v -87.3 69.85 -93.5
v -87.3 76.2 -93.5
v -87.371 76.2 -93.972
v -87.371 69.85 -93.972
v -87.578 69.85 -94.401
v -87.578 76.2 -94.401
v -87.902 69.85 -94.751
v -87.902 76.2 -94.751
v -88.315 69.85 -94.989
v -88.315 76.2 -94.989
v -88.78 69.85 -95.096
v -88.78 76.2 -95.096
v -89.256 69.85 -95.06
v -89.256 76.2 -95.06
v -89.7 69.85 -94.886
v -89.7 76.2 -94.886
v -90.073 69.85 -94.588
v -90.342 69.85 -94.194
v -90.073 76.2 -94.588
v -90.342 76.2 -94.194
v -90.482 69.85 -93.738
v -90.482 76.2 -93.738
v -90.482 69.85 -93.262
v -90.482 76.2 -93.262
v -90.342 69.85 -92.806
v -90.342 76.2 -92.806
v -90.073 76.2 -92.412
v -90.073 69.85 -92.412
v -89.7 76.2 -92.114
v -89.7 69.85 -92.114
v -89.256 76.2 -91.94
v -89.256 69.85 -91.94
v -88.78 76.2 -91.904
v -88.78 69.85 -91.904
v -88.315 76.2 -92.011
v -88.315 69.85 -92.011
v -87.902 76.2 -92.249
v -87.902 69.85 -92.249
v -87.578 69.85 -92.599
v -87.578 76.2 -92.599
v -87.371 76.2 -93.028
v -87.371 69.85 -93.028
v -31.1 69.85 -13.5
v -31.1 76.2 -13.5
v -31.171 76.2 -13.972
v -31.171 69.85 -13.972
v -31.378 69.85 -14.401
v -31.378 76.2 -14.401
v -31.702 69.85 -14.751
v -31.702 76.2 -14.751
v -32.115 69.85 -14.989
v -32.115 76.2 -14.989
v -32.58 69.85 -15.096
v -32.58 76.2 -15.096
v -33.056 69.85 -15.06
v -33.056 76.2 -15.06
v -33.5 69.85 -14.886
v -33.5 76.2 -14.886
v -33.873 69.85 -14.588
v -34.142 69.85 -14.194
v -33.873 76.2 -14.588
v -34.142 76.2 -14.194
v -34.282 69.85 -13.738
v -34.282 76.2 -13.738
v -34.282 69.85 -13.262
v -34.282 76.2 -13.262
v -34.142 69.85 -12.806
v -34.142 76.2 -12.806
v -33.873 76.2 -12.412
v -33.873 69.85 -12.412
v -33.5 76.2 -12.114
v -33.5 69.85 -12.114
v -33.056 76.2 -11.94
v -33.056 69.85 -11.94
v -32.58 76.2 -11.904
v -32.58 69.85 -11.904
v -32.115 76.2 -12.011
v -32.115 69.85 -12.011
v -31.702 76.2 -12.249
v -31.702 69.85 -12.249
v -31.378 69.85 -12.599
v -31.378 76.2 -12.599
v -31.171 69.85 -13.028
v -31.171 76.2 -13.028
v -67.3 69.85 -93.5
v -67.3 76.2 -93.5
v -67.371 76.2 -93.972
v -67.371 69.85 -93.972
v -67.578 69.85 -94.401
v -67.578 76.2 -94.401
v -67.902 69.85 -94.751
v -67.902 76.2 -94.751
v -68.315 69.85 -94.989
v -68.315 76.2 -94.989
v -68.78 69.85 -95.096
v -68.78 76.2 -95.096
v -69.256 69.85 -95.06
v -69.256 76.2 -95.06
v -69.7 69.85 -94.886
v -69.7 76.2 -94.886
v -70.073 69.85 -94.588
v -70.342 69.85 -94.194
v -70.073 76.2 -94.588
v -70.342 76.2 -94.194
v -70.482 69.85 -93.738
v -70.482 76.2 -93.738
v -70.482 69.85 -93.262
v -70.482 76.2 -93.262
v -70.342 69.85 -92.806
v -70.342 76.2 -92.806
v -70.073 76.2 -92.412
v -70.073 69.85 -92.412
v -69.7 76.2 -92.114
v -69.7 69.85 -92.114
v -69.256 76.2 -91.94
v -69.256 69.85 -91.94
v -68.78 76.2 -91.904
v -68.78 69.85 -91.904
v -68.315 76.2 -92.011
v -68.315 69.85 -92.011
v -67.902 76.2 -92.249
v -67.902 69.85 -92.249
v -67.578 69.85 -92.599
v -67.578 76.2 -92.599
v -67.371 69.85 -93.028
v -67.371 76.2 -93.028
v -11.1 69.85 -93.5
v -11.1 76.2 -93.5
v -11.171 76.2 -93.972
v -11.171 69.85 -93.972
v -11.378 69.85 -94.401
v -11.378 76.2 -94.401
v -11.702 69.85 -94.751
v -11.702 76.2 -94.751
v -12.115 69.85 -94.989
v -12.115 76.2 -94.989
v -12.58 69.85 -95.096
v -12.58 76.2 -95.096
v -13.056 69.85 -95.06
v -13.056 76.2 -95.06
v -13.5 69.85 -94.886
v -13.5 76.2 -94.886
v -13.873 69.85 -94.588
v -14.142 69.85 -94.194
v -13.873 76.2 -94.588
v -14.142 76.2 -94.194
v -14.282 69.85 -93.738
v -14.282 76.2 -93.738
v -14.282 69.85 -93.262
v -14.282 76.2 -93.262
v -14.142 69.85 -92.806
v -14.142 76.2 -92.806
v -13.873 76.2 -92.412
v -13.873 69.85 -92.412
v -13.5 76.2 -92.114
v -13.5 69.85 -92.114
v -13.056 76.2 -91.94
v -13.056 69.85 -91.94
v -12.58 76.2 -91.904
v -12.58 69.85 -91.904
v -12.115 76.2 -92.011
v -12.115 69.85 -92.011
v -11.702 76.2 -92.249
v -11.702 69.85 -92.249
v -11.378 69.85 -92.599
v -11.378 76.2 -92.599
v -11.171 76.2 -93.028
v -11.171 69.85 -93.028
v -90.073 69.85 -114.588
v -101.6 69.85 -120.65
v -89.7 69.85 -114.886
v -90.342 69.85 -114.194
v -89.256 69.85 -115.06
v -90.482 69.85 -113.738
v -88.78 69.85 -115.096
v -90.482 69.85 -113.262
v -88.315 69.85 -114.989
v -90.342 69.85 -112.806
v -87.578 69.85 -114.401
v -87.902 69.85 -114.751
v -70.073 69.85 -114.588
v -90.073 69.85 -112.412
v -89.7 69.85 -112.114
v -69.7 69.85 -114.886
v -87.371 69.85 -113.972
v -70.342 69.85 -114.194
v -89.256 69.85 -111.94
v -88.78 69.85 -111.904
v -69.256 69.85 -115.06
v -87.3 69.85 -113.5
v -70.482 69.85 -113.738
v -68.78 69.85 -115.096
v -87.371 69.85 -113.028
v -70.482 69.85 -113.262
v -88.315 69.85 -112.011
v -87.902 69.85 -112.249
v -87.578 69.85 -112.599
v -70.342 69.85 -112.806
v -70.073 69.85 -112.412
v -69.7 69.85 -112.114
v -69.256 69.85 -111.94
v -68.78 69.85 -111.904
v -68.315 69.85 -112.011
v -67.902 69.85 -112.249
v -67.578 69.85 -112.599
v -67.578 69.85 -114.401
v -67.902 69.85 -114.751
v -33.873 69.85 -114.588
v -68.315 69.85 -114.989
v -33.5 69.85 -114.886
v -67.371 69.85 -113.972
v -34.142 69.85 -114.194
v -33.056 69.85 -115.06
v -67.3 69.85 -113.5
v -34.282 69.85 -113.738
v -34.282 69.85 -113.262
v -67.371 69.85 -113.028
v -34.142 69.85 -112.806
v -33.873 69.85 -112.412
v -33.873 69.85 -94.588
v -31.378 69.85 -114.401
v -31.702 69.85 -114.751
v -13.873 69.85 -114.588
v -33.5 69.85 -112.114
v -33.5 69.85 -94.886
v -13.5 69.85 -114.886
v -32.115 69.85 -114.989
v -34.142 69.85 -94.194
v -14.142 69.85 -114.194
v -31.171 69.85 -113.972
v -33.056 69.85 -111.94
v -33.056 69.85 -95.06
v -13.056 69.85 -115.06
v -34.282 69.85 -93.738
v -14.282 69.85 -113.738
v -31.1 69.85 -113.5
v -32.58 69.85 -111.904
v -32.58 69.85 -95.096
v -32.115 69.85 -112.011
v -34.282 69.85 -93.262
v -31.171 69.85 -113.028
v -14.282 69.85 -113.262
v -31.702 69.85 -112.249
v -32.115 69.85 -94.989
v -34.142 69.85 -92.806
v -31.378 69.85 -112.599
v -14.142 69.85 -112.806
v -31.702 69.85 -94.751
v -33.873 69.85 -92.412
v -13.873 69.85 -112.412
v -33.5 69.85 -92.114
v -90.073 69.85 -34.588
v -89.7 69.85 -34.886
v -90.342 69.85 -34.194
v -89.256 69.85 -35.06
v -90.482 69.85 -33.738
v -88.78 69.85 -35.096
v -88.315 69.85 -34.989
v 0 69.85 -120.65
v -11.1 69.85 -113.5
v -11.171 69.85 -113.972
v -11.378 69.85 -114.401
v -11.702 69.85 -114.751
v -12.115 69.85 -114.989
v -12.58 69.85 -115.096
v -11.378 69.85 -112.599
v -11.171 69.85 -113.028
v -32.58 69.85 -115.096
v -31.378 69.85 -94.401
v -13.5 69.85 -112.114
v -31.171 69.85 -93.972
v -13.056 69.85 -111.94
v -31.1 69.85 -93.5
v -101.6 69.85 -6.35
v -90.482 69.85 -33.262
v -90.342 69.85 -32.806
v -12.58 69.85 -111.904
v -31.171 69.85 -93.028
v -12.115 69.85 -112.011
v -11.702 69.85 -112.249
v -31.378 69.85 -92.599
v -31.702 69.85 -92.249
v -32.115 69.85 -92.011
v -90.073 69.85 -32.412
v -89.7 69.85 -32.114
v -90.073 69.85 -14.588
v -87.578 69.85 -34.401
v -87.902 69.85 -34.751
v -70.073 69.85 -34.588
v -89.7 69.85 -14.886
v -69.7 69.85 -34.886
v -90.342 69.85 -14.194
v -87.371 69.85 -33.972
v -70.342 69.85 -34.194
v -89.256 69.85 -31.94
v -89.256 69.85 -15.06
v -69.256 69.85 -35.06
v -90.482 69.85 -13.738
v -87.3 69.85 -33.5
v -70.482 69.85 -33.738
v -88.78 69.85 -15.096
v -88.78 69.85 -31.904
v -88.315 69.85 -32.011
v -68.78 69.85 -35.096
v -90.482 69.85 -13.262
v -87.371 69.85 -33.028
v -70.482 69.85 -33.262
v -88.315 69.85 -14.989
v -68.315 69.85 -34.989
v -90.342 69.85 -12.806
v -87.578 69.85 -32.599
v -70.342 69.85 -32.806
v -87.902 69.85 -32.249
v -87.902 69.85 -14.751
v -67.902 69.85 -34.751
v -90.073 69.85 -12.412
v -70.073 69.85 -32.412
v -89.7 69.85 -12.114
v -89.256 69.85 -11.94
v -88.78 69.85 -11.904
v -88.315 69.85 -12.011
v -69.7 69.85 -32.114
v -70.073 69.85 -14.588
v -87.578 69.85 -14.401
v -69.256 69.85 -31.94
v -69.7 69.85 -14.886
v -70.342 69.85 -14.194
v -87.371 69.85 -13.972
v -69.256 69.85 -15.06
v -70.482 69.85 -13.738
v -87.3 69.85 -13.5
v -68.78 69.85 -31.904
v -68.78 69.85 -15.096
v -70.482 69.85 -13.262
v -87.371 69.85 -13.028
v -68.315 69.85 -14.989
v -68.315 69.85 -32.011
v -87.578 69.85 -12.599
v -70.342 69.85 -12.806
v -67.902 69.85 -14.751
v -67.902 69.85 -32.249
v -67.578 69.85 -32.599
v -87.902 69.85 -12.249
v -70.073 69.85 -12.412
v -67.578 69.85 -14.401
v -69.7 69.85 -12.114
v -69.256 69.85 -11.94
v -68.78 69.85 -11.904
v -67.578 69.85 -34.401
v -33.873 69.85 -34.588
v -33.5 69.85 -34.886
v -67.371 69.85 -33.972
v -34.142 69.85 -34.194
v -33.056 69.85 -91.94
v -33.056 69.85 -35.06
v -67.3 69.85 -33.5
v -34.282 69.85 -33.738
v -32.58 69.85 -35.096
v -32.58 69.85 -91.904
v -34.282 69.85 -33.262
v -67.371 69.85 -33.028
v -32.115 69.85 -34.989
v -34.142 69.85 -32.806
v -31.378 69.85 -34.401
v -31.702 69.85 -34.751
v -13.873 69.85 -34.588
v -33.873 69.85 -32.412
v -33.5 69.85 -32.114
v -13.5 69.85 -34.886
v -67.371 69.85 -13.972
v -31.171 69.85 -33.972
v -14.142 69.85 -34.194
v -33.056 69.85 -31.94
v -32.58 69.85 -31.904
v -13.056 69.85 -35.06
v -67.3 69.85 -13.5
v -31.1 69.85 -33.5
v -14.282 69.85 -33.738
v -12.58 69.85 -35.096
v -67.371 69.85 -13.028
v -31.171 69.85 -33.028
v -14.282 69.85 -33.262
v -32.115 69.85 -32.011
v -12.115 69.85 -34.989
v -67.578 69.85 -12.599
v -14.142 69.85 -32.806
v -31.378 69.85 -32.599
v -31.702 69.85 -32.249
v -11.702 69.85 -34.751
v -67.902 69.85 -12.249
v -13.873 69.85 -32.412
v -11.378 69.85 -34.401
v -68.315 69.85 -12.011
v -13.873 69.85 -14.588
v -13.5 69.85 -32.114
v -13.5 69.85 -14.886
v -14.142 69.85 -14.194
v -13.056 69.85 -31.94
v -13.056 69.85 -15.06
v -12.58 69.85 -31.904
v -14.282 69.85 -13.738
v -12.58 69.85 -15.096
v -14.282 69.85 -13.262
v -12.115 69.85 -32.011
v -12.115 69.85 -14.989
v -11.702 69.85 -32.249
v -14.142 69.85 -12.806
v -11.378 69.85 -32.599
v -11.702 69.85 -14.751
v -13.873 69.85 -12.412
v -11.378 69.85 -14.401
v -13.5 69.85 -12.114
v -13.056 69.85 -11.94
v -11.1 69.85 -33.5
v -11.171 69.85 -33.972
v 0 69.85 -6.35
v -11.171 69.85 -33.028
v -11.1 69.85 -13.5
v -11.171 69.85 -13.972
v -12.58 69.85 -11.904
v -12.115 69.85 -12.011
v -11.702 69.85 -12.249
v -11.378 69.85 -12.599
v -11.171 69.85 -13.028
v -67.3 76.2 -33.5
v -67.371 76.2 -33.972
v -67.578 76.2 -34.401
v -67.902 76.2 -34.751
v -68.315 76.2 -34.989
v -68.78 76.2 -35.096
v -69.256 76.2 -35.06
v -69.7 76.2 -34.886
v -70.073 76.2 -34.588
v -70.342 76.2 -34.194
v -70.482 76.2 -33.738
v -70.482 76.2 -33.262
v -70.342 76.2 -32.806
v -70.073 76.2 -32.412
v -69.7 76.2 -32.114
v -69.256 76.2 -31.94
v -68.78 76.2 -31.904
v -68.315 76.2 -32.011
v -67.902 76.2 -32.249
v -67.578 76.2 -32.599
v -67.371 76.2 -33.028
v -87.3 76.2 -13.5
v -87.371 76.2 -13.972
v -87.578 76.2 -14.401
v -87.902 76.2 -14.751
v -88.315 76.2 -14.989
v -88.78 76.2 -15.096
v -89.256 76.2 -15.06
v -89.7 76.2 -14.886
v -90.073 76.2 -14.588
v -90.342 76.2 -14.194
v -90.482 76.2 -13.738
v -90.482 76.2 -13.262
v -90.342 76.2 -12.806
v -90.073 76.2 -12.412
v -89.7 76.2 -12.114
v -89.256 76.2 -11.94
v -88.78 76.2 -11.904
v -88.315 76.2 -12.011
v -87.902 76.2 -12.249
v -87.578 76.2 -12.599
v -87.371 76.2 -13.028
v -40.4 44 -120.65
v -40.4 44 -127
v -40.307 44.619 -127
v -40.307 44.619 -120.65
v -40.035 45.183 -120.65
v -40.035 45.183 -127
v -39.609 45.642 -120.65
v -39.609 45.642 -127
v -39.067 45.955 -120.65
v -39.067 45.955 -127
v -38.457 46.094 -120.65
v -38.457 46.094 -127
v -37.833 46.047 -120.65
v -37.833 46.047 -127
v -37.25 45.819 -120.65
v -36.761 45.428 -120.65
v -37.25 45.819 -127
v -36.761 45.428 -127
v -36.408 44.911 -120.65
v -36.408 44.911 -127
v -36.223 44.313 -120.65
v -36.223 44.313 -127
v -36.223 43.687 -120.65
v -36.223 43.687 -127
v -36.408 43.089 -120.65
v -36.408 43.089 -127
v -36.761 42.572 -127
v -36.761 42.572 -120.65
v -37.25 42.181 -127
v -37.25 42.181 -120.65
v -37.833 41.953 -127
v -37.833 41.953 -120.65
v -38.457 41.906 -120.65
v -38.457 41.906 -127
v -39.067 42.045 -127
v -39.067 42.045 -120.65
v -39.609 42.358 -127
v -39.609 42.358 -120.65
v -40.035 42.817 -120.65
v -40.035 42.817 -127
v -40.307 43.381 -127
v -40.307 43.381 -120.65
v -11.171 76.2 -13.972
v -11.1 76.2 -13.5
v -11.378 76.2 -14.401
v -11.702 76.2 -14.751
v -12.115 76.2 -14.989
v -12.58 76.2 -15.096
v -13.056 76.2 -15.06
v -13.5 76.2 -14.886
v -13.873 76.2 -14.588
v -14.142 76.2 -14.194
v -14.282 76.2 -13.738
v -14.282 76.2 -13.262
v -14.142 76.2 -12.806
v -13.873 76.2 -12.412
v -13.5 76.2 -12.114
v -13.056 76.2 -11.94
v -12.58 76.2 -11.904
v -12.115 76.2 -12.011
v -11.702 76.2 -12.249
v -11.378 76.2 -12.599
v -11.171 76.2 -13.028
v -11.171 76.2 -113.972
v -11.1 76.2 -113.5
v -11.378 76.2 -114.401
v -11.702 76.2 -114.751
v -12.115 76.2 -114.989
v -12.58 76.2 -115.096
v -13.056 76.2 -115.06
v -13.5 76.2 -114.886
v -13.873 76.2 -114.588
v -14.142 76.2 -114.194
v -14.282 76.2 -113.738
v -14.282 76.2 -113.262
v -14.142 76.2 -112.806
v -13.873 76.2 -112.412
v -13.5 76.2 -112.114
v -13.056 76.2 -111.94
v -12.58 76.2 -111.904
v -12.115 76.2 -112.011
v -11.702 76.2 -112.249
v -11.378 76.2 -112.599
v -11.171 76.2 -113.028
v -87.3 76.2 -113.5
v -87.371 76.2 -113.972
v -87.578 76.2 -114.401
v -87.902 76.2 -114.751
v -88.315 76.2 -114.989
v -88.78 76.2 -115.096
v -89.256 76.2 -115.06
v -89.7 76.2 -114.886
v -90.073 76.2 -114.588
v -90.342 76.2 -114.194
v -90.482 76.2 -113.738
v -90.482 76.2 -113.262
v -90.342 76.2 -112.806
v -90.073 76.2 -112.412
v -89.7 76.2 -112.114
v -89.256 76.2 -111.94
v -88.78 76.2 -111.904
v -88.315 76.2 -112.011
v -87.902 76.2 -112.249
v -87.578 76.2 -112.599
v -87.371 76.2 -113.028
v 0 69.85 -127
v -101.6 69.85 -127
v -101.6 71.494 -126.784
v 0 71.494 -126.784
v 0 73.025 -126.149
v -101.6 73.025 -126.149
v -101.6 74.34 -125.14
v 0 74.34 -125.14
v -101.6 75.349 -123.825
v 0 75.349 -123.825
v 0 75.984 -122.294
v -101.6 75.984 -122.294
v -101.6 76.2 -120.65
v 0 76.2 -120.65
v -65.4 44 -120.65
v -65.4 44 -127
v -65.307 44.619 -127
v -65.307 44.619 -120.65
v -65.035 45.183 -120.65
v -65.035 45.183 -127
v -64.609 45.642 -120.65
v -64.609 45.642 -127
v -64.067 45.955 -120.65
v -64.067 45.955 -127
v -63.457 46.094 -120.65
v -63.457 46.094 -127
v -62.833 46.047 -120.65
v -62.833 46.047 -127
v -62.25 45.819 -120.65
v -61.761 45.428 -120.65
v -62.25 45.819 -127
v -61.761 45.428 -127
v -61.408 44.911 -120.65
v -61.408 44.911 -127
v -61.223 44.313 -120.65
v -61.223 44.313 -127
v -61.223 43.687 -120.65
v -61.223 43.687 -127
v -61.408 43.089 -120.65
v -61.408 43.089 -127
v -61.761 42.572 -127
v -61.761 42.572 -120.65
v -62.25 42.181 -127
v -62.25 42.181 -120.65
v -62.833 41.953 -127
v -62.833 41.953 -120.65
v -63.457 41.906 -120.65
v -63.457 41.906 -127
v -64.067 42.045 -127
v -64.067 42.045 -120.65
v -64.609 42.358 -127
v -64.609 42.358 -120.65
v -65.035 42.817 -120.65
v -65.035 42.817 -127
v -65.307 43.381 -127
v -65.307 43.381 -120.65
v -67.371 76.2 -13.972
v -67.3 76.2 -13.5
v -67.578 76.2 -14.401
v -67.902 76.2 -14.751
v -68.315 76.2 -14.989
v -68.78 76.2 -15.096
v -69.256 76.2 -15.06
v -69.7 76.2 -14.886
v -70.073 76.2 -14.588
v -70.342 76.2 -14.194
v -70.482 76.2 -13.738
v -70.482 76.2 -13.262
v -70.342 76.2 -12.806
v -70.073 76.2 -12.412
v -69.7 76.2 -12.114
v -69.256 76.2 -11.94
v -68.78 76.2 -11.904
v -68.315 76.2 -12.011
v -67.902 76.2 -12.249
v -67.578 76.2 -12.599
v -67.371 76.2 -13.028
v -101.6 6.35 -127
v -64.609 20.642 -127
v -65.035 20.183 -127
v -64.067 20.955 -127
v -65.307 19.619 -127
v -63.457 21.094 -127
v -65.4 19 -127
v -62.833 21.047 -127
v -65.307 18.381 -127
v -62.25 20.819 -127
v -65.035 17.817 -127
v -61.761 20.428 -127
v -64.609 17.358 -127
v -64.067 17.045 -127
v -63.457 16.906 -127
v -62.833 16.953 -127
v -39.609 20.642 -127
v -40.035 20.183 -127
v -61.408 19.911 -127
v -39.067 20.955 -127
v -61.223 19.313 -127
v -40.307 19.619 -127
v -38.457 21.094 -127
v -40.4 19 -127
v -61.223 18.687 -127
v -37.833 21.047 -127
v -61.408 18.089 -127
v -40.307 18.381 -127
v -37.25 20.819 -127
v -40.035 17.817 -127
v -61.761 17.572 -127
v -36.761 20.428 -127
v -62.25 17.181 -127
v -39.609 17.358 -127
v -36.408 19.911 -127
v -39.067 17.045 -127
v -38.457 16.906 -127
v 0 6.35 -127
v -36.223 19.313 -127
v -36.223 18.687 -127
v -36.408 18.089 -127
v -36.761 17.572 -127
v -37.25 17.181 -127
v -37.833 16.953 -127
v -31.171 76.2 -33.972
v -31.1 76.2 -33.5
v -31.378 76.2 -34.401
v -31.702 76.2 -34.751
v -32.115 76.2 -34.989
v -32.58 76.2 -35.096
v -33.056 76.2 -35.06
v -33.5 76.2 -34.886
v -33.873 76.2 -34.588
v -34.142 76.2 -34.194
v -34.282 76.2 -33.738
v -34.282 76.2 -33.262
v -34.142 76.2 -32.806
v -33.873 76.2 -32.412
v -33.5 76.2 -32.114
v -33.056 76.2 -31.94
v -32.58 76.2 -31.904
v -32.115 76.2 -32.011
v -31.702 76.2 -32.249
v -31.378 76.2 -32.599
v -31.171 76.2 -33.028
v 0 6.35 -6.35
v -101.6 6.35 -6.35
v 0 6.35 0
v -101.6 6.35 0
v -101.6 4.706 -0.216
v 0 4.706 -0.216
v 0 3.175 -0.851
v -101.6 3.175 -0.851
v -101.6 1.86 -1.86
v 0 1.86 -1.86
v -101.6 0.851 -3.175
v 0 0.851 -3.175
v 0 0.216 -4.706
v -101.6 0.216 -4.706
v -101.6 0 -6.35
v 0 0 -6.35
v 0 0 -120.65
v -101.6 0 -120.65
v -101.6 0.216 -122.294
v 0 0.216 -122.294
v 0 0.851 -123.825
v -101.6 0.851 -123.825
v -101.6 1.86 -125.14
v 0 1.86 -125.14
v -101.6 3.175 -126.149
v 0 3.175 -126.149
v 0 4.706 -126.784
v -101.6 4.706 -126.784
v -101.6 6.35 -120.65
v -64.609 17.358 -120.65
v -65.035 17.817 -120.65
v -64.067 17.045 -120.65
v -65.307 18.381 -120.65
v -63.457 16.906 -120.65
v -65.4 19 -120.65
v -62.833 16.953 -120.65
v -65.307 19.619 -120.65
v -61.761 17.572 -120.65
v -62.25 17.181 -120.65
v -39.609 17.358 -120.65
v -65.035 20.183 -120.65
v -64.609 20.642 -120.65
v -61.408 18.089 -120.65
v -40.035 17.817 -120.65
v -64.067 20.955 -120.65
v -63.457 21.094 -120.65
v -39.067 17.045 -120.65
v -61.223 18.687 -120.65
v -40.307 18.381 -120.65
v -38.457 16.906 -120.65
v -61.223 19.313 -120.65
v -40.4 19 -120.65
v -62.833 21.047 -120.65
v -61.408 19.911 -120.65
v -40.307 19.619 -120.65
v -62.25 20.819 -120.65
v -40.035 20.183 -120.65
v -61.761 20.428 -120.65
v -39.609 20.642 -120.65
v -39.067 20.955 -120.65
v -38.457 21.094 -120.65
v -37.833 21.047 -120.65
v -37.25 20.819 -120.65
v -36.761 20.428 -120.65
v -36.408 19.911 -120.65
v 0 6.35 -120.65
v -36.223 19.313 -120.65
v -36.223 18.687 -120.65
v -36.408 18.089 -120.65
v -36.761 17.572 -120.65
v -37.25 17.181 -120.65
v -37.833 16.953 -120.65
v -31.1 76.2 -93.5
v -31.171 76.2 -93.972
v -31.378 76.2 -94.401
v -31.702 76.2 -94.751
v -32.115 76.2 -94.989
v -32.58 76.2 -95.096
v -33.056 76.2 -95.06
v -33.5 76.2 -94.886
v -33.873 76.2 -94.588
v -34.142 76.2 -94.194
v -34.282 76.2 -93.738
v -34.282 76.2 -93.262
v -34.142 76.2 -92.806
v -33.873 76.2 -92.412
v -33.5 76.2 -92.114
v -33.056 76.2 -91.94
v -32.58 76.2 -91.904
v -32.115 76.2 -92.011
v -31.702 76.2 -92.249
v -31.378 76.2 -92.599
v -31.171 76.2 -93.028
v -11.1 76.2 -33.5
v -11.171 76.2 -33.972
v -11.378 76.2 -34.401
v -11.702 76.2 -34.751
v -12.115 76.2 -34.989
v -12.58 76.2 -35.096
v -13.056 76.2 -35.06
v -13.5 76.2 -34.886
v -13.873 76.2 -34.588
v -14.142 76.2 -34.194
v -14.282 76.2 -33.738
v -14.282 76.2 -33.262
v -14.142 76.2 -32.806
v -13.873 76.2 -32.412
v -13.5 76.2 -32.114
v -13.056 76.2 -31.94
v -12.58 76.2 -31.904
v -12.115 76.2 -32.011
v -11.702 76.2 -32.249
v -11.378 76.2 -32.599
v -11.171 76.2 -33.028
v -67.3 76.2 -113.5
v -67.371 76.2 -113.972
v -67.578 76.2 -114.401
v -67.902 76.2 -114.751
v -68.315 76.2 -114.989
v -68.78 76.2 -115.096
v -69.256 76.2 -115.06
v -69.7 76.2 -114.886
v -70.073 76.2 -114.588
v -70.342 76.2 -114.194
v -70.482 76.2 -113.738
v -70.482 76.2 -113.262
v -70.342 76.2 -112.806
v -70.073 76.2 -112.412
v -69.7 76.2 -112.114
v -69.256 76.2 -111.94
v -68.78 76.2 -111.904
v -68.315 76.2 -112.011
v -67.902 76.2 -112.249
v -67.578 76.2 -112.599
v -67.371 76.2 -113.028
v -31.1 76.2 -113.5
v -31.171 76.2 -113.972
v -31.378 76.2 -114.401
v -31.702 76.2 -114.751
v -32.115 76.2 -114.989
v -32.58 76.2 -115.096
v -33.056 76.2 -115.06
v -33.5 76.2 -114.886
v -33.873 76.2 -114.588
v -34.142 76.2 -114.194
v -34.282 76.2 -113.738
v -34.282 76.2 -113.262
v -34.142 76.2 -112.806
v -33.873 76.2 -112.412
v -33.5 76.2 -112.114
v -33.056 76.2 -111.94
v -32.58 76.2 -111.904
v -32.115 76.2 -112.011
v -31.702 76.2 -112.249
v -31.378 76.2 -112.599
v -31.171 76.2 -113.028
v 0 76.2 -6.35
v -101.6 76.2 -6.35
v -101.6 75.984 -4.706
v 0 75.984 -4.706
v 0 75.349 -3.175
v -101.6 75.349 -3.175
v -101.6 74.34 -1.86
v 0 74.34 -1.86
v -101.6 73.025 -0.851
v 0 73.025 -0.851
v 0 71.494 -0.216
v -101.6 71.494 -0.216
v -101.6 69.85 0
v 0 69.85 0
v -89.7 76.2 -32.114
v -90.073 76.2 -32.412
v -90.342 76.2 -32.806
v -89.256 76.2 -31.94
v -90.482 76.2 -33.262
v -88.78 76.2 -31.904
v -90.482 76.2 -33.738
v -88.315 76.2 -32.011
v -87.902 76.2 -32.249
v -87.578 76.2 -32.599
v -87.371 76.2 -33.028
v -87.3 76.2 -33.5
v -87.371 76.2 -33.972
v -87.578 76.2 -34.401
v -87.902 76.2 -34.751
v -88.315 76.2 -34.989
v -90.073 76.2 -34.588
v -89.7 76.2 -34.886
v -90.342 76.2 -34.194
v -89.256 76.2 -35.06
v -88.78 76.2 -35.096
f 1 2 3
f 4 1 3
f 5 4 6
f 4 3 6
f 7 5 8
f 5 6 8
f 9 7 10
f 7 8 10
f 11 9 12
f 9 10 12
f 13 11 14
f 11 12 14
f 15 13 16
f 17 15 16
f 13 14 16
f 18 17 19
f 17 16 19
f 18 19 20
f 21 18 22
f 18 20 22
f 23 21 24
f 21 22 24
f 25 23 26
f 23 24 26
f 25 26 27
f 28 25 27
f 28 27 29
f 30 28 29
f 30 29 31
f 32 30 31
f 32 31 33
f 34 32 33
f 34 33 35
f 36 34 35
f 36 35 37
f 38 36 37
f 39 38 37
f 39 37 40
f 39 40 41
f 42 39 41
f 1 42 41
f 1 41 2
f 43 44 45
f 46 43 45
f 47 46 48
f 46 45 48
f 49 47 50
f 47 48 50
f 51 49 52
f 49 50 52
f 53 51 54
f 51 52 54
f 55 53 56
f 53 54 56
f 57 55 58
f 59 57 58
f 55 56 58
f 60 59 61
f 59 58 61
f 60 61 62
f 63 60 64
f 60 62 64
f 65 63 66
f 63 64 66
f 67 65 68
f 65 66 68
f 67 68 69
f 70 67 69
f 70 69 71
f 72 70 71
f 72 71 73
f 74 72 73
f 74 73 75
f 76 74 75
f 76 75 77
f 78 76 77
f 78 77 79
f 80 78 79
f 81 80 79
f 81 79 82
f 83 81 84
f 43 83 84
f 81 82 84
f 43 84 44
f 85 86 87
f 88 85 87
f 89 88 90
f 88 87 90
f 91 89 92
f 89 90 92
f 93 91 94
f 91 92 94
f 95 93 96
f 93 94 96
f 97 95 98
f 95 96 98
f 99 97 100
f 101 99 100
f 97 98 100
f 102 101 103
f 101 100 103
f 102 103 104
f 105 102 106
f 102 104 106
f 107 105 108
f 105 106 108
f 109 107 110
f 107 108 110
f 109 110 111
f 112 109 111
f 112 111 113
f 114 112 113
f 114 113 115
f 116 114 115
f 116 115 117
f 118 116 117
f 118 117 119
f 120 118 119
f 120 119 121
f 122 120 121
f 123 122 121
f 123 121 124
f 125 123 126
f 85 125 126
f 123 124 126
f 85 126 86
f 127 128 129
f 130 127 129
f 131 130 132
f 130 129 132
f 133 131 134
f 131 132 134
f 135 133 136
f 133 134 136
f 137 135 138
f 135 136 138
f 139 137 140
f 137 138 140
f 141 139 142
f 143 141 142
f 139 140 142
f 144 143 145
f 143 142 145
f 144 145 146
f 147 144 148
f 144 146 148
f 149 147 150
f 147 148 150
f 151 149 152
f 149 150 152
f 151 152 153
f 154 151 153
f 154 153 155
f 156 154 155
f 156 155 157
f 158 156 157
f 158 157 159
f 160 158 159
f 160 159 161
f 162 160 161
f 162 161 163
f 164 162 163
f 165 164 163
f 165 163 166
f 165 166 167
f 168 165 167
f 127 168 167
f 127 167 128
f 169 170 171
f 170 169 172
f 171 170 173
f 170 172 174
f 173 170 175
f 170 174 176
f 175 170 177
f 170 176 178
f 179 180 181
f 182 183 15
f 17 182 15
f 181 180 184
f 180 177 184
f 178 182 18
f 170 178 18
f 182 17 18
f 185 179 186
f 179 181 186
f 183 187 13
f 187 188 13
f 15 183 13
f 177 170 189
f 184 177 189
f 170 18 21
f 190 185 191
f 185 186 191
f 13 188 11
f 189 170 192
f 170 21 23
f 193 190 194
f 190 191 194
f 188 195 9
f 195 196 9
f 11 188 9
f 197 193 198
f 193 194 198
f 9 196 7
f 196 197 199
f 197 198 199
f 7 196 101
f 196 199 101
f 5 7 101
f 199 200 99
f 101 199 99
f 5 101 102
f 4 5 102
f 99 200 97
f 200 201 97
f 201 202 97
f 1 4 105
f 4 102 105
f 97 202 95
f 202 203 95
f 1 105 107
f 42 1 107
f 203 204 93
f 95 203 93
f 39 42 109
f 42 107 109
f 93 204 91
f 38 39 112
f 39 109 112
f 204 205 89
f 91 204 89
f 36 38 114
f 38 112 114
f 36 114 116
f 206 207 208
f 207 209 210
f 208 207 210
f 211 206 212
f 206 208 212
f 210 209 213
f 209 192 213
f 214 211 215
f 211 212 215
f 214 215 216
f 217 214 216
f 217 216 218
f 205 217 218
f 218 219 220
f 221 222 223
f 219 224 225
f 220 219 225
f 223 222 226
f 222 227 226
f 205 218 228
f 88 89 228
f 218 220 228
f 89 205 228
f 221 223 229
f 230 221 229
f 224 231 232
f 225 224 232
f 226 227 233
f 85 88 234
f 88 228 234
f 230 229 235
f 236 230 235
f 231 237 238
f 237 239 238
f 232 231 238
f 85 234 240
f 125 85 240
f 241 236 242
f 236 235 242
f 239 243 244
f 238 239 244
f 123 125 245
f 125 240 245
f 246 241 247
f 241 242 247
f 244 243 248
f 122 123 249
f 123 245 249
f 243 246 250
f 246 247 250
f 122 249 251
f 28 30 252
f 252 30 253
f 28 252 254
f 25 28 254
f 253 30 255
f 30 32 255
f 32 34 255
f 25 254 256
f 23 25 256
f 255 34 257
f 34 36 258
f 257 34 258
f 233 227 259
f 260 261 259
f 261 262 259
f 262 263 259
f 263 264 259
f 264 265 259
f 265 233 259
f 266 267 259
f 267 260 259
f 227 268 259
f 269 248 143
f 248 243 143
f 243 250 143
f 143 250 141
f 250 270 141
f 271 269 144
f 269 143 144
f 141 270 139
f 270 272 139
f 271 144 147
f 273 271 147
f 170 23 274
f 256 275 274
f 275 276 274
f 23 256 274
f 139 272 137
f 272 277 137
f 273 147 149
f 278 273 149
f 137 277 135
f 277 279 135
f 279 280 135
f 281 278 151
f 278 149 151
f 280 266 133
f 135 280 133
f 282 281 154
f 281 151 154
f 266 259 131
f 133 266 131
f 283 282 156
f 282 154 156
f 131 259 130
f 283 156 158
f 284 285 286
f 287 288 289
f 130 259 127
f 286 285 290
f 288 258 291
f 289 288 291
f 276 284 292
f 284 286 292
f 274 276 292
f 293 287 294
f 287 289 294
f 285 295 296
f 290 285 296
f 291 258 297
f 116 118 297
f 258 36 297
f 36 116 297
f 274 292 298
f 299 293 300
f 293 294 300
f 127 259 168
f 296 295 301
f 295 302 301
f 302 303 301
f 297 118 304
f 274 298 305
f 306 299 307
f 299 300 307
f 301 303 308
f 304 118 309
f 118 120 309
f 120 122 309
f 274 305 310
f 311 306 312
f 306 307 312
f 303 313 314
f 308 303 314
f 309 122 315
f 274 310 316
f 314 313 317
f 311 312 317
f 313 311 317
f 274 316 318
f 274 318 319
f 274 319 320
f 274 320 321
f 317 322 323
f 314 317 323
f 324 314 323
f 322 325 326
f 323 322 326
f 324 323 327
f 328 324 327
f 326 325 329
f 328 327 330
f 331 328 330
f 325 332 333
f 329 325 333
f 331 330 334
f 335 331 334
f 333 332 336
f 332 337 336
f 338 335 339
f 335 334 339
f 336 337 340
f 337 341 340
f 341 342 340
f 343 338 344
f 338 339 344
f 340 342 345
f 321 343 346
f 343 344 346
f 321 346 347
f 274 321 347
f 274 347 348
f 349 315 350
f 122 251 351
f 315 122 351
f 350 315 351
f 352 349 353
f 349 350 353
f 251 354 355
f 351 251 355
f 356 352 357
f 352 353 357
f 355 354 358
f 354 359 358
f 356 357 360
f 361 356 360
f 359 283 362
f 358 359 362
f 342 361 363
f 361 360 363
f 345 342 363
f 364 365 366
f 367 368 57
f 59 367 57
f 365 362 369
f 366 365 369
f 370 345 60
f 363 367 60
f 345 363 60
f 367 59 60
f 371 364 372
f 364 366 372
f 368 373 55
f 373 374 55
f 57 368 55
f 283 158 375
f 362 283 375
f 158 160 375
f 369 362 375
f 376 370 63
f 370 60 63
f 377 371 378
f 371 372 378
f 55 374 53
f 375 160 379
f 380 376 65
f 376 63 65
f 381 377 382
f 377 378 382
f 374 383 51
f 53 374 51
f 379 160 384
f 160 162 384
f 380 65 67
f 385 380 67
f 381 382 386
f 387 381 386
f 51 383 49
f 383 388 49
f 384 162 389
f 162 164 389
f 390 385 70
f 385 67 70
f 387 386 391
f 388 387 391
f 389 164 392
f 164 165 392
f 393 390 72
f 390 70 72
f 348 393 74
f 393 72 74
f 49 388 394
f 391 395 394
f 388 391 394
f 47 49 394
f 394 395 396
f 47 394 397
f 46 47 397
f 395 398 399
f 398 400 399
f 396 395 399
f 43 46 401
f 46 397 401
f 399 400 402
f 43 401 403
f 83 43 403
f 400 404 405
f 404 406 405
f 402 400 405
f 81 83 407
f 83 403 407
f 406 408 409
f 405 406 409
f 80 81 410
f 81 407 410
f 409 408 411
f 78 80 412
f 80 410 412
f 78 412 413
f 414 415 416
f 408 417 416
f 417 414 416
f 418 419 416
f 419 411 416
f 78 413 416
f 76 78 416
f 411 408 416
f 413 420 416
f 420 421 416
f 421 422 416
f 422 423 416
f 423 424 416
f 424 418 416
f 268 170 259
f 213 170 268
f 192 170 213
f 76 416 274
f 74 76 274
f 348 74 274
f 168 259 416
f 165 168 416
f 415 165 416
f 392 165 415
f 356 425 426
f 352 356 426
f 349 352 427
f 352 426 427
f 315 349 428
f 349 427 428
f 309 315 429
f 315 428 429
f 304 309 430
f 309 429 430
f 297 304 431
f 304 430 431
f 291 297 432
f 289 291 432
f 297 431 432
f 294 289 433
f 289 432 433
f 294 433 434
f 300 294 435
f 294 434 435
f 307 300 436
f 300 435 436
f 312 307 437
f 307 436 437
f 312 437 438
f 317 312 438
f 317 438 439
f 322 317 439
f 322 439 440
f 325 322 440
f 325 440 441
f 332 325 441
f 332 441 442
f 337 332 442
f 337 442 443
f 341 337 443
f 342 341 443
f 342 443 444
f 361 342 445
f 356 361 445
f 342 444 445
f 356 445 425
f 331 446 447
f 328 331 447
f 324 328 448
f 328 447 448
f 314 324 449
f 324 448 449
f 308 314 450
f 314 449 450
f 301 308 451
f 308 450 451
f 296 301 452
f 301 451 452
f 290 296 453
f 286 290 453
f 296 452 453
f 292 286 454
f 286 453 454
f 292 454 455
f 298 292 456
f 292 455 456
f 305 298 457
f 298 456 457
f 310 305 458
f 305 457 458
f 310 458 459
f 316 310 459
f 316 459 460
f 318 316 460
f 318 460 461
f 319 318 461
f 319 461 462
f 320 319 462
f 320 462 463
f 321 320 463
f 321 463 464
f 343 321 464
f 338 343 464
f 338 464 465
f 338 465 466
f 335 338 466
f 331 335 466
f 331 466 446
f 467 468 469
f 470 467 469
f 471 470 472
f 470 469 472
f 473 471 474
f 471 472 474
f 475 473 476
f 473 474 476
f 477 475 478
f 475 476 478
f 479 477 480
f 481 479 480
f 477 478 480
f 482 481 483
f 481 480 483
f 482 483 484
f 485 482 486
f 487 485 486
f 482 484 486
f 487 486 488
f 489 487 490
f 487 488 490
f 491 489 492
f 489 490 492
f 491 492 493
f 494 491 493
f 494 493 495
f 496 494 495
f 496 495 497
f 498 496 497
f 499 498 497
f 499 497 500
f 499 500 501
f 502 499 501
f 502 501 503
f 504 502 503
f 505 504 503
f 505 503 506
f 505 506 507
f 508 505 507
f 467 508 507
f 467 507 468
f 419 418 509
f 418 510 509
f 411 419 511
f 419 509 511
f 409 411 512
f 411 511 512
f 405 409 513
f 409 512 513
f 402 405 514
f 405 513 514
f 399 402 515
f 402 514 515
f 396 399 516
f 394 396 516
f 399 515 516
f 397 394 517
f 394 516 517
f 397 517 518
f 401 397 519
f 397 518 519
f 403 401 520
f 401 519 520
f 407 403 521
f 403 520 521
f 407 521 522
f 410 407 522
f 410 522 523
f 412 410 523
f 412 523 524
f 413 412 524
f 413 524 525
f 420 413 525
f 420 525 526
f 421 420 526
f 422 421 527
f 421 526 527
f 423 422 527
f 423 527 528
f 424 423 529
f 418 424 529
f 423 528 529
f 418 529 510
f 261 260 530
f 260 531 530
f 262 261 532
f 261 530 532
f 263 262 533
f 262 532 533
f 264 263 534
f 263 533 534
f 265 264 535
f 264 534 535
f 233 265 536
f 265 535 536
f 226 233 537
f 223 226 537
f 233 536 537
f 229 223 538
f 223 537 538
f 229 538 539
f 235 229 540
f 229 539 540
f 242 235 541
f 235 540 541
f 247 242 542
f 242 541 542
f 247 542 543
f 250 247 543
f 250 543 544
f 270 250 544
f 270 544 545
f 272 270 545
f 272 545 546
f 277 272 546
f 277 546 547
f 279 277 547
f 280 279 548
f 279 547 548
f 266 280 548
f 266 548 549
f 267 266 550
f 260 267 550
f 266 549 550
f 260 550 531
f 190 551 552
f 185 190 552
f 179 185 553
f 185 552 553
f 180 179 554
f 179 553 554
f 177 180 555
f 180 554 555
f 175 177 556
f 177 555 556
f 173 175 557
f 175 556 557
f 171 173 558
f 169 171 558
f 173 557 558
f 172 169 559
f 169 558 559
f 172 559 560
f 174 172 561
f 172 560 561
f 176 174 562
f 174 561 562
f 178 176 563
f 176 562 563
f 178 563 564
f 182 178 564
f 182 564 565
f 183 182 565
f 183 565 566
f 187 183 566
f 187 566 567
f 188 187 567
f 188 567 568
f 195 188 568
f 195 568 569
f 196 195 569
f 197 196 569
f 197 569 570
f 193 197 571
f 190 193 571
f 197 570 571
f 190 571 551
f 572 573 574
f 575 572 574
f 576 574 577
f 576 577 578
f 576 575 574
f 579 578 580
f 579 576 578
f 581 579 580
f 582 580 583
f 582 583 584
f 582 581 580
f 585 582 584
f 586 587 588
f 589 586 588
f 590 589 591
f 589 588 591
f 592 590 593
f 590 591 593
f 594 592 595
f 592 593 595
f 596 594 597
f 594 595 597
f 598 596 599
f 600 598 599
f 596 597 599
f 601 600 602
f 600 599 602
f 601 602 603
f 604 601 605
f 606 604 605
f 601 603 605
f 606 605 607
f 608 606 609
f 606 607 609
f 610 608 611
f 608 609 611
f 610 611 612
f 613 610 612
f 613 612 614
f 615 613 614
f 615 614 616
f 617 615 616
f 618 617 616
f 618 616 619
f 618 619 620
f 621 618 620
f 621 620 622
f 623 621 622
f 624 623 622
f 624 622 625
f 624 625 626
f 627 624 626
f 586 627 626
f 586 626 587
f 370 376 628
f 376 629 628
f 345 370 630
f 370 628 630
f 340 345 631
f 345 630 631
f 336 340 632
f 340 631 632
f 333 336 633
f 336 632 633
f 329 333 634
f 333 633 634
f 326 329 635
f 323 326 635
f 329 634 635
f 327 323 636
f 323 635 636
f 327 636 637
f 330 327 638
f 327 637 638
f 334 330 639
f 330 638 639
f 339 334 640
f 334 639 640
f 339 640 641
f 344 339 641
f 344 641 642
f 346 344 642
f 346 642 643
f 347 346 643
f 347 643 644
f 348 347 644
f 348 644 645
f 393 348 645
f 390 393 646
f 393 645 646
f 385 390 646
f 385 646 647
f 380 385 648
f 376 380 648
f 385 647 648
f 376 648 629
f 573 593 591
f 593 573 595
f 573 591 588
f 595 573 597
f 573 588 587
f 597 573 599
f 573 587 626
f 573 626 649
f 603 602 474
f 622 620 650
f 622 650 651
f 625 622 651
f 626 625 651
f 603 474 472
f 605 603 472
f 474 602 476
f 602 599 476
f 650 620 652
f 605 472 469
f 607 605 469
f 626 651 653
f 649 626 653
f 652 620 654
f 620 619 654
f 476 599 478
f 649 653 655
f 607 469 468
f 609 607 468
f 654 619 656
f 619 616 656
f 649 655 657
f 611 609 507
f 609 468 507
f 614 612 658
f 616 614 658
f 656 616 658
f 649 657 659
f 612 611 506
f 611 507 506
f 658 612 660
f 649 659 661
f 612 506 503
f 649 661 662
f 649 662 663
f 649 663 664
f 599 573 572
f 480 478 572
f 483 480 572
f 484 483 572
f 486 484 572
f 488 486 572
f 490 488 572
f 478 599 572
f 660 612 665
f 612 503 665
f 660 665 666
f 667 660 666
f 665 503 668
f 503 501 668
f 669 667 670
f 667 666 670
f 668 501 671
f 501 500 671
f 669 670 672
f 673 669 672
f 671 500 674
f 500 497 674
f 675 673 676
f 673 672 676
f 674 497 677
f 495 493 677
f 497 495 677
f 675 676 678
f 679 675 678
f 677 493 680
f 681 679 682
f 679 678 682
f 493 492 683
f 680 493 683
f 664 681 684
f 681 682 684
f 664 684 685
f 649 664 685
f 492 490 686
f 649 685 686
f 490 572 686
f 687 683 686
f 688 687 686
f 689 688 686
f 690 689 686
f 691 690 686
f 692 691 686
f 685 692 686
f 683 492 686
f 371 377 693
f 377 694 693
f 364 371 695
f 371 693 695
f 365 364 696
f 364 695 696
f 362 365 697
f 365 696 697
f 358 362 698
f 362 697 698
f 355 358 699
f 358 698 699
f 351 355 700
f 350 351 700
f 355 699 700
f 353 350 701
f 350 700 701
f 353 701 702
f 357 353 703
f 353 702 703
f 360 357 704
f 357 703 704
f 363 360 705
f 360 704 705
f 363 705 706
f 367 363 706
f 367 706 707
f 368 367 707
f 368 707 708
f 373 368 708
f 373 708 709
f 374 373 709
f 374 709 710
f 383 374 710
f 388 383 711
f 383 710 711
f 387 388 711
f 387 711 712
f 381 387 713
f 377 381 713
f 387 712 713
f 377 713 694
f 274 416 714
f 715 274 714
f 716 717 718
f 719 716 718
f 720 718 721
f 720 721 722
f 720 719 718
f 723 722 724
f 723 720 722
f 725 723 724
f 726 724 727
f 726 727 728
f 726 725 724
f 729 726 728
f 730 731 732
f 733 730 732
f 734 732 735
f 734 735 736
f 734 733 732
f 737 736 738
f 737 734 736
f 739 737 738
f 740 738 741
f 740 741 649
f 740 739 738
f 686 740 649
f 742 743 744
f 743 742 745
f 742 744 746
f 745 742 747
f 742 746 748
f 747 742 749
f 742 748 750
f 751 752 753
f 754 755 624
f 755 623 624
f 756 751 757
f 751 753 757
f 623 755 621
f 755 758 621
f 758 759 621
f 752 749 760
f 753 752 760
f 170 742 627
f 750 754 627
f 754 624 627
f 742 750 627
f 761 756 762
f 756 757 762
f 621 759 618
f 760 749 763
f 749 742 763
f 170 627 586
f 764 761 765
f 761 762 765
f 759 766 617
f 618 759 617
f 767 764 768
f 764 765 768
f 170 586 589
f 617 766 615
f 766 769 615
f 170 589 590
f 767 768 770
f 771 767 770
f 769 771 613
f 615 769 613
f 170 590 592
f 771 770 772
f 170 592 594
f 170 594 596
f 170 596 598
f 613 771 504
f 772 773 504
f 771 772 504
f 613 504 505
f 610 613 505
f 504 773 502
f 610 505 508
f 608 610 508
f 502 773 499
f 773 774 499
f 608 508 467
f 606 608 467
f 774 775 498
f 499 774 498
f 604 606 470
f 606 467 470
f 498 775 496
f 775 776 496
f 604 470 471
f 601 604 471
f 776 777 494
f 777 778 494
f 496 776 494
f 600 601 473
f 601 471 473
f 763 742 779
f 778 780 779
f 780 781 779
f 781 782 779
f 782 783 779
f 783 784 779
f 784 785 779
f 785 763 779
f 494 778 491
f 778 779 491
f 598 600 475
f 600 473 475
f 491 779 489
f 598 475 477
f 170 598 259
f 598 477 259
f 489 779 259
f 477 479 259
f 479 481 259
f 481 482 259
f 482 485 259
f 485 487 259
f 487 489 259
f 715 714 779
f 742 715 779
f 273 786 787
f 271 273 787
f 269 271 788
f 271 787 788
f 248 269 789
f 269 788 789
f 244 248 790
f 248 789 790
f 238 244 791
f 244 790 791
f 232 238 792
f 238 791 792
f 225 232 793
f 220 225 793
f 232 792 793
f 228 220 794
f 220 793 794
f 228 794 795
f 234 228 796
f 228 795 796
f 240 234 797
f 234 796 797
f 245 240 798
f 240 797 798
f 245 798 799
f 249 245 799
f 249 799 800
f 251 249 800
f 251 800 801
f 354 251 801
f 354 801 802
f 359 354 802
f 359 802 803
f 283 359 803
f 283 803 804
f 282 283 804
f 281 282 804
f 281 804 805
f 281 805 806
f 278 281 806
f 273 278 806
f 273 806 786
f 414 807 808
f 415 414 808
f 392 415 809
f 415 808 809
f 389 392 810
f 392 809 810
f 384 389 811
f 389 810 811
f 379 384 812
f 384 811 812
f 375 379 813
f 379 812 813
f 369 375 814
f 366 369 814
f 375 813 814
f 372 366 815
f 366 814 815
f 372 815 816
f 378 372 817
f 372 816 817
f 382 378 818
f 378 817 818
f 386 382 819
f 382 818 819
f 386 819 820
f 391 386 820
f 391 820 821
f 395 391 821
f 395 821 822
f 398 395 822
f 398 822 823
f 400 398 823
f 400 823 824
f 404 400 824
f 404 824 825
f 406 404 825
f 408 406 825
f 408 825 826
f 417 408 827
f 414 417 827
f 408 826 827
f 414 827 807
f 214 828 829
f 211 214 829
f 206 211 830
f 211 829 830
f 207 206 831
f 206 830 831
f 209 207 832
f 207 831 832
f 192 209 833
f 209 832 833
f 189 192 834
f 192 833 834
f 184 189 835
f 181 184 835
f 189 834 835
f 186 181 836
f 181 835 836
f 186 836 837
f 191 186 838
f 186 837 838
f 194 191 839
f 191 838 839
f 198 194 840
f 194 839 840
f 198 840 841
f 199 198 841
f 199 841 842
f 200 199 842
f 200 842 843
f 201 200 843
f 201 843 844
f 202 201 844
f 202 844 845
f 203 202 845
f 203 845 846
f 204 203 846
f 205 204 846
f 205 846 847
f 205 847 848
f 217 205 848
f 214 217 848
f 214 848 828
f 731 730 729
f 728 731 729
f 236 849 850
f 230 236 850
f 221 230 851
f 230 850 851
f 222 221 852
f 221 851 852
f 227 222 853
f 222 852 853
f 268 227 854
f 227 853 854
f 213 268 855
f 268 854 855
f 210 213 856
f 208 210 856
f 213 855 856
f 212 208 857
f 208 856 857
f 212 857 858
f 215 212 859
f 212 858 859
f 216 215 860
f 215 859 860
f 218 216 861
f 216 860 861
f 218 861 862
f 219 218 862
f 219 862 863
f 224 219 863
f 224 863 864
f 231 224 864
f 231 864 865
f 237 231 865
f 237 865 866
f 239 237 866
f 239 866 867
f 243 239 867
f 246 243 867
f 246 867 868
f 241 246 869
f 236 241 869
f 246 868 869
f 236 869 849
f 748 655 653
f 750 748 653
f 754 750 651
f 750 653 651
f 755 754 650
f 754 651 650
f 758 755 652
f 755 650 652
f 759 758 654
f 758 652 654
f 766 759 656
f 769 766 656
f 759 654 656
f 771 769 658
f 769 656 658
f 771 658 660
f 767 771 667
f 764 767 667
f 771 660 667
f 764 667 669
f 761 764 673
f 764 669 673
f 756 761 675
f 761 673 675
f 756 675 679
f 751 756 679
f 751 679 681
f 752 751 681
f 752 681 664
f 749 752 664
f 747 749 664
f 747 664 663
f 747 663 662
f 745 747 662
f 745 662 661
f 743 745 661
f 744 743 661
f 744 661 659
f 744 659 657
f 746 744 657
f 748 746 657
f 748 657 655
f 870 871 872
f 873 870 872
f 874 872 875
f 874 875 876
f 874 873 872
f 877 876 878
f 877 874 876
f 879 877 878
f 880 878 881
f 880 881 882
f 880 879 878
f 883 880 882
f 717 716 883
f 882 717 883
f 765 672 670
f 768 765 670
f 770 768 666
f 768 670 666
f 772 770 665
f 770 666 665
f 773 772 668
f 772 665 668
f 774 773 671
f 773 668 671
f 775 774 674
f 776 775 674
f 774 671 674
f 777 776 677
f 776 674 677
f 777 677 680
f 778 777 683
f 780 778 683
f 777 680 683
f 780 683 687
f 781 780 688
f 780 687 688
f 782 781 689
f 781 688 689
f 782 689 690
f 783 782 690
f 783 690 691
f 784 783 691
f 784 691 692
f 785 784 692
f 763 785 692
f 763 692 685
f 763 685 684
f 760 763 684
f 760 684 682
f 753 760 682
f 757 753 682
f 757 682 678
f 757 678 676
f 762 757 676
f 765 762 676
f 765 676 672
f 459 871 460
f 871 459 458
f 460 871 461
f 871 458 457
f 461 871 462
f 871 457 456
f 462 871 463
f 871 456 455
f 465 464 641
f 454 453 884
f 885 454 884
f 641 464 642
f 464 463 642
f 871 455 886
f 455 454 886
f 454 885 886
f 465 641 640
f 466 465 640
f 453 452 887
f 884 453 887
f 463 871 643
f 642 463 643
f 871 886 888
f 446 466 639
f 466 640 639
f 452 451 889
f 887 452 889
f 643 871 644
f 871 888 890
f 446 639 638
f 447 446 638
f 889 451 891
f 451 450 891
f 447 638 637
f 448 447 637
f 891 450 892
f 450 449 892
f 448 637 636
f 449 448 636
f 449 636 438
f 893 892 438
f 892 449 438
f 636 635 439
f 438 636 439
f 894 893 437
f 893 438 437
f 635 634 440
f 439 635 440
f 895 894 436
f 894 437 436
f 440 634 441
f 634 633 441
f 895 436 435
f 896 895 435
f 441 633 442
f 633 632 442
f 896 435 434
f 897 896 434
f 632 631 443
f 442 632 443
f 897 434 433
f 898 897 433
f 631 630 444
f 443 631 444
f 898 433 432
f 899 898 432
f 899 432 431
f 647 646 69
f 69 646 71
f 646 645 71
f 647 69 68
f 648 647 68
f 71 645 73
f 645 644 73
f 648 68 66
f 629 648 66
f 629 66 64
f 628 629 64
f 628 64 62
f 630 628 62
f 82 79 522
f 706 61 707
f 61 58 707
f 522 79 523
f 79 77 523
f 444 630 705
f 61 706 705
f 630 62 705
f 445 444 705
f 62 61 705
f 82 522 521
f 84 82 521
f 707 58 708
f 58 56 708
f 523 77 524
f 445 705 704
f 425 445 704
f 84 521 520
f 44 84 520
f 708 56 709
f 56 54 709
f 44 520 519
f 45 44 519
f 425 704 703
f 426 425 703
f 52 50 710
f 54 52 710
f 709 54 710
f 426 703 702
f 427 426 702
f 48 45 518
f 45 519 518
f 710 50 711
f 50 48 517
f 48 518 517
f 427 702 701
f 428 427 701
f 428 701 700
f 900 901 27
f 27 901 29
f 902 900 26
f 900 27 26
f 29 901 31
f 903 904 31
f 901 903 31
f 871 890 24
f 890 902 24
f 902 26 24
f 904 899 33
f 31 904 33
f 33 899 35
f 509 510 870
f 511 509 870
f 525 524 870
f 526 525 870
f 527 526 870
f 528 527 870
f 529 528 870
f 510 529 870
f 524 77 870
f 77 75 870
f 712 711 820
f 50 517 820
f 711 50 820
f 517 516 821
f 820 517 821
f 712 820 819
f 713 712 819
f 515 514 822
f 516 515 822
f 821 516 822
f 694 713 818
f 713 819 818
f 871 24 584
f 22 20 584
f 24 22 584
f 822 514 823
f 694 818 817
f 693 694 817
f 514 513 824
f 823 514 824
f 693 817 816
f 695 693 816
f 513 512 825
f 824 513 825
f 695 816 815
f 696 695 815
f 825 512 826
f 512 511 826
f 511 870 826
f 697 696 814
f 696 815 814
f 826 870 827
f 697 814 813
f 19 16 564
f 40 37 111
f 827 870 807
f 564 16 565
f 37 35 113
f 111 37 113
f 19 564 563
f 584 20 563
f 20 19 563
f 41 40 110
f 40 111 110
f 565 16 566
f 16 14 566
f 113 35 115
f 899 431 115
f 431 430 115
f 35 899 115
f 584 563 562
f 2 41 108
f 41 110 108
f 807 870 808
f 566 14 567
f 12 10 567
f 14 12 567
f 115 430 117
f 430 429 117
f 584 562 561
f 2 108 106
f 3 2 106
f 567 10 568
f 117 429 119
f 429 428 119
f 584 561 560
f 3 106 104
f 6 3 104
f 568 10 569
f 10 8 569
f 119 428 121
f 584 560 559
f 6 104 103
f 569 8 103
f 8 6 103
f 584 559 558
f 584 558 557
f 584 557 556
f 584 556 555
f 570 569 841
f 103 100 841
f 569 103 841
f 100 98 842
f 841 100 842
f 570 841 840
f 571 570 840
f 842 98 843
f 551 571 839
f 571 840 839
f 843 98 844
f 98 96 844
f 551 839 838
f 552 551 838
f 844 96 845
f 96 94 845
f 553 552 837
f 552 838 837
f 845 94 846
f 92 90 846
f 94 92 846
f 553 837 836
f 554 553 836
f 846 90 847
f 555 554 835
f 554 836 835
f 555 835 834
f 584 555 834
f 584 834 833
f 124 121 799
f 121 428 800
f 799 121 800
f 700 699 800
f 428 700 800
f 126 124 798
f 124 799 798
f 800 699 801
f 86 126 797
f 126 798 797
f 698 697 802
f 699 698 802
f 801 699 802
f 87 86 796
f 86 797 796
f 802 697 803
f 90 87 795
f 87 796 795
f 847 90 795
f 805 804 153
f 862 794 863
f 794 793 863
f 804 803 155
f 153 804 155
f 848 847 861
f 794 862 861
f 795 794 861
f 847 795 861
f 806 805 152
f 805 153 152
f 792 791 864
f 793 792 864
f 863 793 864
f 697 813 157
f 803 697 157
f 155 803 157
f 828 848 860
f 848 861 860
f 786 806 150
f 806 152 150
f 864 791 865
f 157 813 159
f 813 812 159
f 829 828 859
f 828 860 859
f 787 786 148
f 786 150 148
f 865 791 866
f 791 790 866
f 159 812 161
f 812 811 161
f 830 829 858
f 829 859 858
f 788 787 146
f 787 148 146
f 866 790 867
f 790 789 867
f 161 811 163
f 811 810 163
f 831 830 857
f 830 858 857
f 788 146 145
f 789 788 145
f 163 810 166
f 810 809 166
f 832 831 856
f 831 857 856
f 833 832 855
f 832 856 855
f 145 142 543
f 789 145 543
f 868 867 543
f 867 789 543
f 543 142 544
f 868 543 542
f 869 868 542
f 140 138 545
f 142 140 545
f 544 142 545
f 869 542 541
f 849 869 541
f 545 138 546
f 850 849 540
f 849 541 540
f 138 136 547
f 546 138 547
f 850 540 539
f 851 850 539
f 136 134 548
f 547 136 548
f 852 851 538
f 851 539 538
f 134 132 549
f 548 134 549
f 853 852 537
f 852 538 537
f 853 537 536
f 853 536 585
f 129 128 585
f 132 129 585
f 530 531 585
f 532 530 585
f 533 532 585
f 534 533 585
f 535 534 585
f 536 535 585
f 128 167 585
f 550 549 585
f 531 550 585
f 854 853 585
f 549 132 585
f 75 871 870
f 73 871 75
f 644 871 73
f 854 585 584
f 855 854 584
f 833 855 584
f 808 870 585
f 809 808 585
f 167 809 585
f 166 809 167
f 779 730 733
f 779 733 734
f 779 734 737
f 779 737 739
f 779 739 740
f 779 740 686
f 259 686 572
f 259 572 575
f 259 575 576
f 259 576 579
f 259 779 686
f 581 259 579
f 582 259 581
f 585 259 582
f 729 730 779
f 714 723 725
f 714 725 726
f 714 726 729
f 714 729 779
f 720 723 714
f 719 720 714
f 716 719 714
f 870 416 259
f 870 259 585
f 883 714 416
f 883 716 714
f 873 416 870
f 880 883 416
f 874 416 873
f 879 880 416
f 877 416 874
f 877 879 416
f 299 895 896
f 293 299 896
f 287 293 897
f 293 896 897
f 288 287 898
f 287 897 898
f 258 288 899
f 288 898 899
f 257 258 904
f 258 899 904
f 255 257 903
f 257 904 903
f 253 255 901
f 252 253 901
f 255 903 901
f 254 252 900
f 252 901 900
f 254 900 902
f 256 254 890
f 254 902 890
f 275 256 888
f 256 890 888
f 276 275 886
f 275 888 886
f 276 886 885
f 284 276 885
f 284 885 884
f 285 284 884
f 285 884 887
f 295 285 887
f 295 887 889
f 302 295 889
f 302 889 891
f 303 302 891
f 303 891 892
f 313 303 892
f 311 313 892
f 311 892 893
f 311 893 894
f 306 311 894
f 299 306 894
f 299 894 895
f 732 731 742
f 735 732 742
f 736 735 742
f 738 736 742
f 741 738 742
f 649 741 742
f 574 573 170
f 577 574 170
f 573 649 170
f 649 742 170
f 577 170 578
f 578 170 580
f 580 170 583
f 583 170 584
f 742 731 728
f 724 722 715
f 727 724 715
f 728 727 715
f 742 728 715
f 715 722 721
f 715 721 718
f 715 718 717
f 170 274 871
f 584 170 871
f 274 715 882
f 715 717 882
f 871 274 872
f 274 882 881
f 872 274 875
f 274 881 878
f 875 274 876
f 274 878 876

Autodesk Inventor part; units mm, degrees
ref_plane "YZ Plane" through (0, 0, 0) normal (1, 0, 0) x (0, 1, 0)
ref_plane "XZ Plane" through (0, 0, 0) normal (0, 1, 0) x (-1, 0, 0)
ref_plane "XY Plane" through (0, 0, 0) normal (0, 0, 1) x (1, 0, 0)
sketch "Sketch1" plane through (0, 0, 0) normal (1, 0, 0) x (0, 1, 0)
  line L0 (6.35, 0) -> (69.85, 0)
  line L1 (76.2, -6.35) -> (76.2, -120.65)
  line L2 (69.85, -127) -> (6.35, -127)
  line L3 (0, -120.65) -> (0, -6.35)
  arc A0 (76.2, -6.35) -> (69.85, 0) centre (69.85, -6.35) ccw
  arc A1 (69.85, -127) -> (76.2, -120.65) centre (69.85, -120.65) ccw
  arc A2 (0, -120.65) -> (6.35, -127) centre (6.35, -120.65) ccw
  arc A3 (6.35, 0) -> (0, -6.35) centre (6.35, -6.35) ccw
  line L4 (69.85, -120.65) -> (69.85, -6.35)
  line L5 (69.85, -6.35) -> (6.35, -6.35)
  line L6 (6.35, -6.35) -> (6.35, -120.65)
  line L7 (6.35, -120.65) -> (69.85, -120.65)
  point P0 (0, 0)
  point P1 (76.2, -127)
  point P2 (76.2, 0)
  point P3 (0, -127)
  dimension "d0" = 76.2
  dimension "d1" = 127
  dimension "d2" = 6.35
  dimension "d3" = 6.35
  dimension "d4" = 6.35
extrude "Extrusion1" add sketch "Sketch1" against normal blind 101.6
sketch "Sketch2" plane through (0, 76.2, -6.35) normal (0, 1, 0) x (1, 0, 0)
  line L0 (0, 0) -> (0, 114.3) construction
  line L1 (0, 57.15) -> (-101.6, 57.15) construction
  line L2 (-101.6, 114.3) -> (-101.6, 0) construction
  line L3 (0, 83.65) -> (-45.4, 83.65) construction
  line L4 (-45.4, 83.65) -> (-45.4, 110.65) construction
  line L5 (-45.4, 110.65) -> (0, 110.65) construction
  line L6 (0, 110.65) -> (0, 83.65) construction
  line L7 (-32.7, 107.15) -> (-12.7, 107.15) construction
  line L8 (-12.7, 107.15) -> (-12.7, 87.15) construction
  line L9 (-12.7, 87.15) -> (-32.7, 87.15) construction
  line L10 (-32.7, 87.15) -> (-32.7, 107.15) construction
  line L11 (-32.7, 107.15) -> (-32.7, 110.65) construction
  line L12 (-32.7, 107.15) -> (-45.4, 107.15) construction
  line L13 (-12.7, 87.15) -> (-12.7, 83.65) construction
  line L14 (-12.7, 87.15) -> (0, 87.15) construction
  circle A0 centre (-32.7, 107.15) radius 1.6
  circle A1 centre (-12.7, 107.15) radius 1.6
  circle A2 centre (-12.7, 87.15) radius 1.6
  circle A3 centre (-32.7, 87.15) radius 1.6
  line L15 (0, 114.3) -> (0, 0) construction
  line L16 (-50.8, 57.15) -> (-50.8, 128.3257) construction
  line L17 (-101.6, 83.65) -> (-56.2, 83.65) construction
  line L18 (-56.2, 83.65) -> (-56.2, 110.65) construction
  line L19 (-56.2, 110.65) -> (-101.6, 110.65) construction
  line L20 (-101.6, 110.65) -> (-101.6, 83.65) construction
  line L21 (-68.9, 107.15) -> (-88.9, 107.15) construction
  line L22 (-88.9, 107.15) -> (-88.9, 87.15) construction
  line L23 (-88.9, 87.15) -> (-68.9, 87.15) construction
  line L24 (-68.9, 87.15) -> (-68.9, 107.15) construction
  line L25 (-68.9, 107.15) -> (-68.9, 110.65) construction
  line L26 (-68.9, 107.15) -> (-56.2, 107.15) construction
  line L27 (-88.9, 87.15) -> (-88.9, 83.65) construction
  line L28 (-88.9, 87.15) -> (-101.6, 87.15) construction
  circle A4 centre (-68.9, 107.15) radius 1.6
  circle A5 centre (-88.9, 107.15) radius 1.6
  circle A6 centre (-88.9, 87.15) radius 1.6
  circle A7 centre (-68.9, 87.15) radius 1.6
  line L29 (0, 30.65) -> (-45.4, 30.65) construction
  line L30 (-45.4, 30.65) -> (-45.4, 3.65) construction
  line L31 (-45.4, 3.65) -> (0, 3.65) construction
  line L32 (0, 3.65) -> (0, 30.65) construction
  line L33 (-32.7, 7.15) -> (-12.7, 7.15) construction
  line L34 (-12.7, 7.15) -> (-12.7, 27.15) construction
  line L35 (-12.7, 27.15) -> (-32.7, 27.15) construction
  line L36 (-32.7, 27.15) -> (-32.7, 7.15) construction
  line L37 (-32.7, 7.15) -> (-32.7, 3.65) construction
  line L38 (-32.7, 7.15) -> (-45.4, 7.15) construction
  line L39 (-12.7, 27.15) -> (-12.7, 30.65) construction
  line L40 (-12.7, 27.15) -> (0, 27.15) construction
  circle A8 centre (-32.7, 7.15) radius 1.6
  circle A9 centre (-12.7, 7.15) radius 1.6
  circle A10 centre (-12.7, 27.15) radius 1.6
  circle A11 centre (-32.7, 27.15) radius 1.6
  line L41 (-68.9, 7.15) -> (-88.9, 7.15) construction
  line L42 (-88.9, 27.15) -> (-68.9, 27.15) construction
  line L43 (-88.9, 27.15) -> (-88.9, 30.65) construction
  line L44 (-88.9, 7.15) -> (-88.9, 27.15) construction
  circle A12 centre (-88.9, 27.15) radius 1.6
  circle A13 centre (-88.9, 7.15) radius 1.6
  line L45 (-101.6, 30.65) -> (-56.2, 30.65) construction
  line L46 (-101.6, 3.65) -> (-101.6, 30.65) construction
  line L47 (-88.9, 27.15) -> (-101.6, 27.15) construction
  line L48 (-56.2, 3.65) -> (-101.6, 3.65) construction
  line L49 (-68.9, 27.15) -> (-68.9, 7.15) construction
  line L50 (-68.9, 7.15) -> (-68.9, 3.65) construction
  circle A14 centre (-68.9, 7.15) radius 1.6
  circle A15 centre (-68.9, 27.15) radius 1.6
  line L51 (-56.2, 30.65) -> (-56.2, 3.65) construction
  line L52 (-68.9, 7.15) -> (-56.2, 7.15) construction
  point P0 (0, -6.35)
  dimension "d7" = 45.4
  dimension "d8" = 27
  dimension "d9" = 20
  dimension "d10" = 20
  dimension "d11" = 3.2
  dimension "d12" = 3.2
  dimension "d13" = 3.2
  dimension "d14" = 3.2
  dimension "d15" = 100
extrude "Extrusion2" cut sketch "Sketch2" against normal up to next
sketch "Sketch3" plane through (0, 6.35, -127) normal (0, 0, -1) x (-1, 0, 0)
  line L0 (38.3, 37.65) -> (63.3, 37.65) construction
  line L1 (63.3, 37.65) -> (63.3, 12.65) construction
  line L2 (63.3, 12.65) -> (38.3, 12.65) construction
  line L3 (38.3, 12.65) -> (38.3, 37.65) construction
  circle A0 centre (38.3, 37.65) radius 2.1
  circle A1 centre (63.3, 37.65) radius 2.1
  circle A2 centre (63.3, 12.65) radius 2.1
  circle A3 centre (38.3, 12.65) radius 2.1
  line L4 (0, -6.35) -> (101.6, -6.35) construction
  line L5 (38.3, 25.15) -> (0, 25.15) construction
  line L6 (0, 0) -> (0, 63.5) construction
  line L7 (63.3, 25.15) -> (101.6, 25.15) construction
  line L8 (101.6, 63.5) -> (101.6, 0) construction
  dimension "d18" = 25
  dimension "d19" = 25
  dimension "d20" = 4.2
  dimension "d21" = 4.2
  dimension "d22" = 4.2
  dimension "d23" = 4.2
  dimension "d24" = 19
extrude "Extrusion3" cut sketch "Sketch3" against normal up to next
equation "\"d12\" = d11"
equation "\"d13\" = d11"
equation "\"d14\" = d11"
equation "\"d16\" = d12"
equation "\"d21\" = d20"
equation "\"d22\" = d20"
equation "\"d23\" = d20"
properties part number "3in x 5in Steel Rectangular Tubing 4in long"
